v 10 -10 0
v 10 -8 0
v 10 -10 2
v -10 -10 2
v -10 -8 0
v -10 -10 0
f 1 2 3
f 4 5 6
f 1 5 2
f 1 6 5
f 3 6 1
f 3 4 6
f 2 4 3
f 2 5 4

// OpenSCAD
// file: triangle.scad
module triangle(c, height, betha)
{ 
    c_right=height*cos(betha);
    c_left=-c+height*cos(betha);
    // draw triangle c=x, C=[0,heigth]
    polygon(points=[ [c_left,0], [c_right,0], [0,height] ]);
}

module isosides_triangle(a)
{
      height= sin(60)*a;
    // draw triangle c=x, C=[0,heigth]
      polygon(points=[ [-a/2,0], [a/2,0], [0,height] ]);
}

module isosceles_triangle(c,height)
{
    // draw triangle c=x, C=[0,heigth]
     polygon(points=[ [-c/2,0], [c/2,0], [0,height] ]);
}

module rightangular_triangle(width, height)
{
      // draw triangle c=x, C=[0,heigth]
     polygon(points=[ [0,0], [width,0], [0,height] ]);
}

rightangular_triangle(2,2);
// main file
// holder triangle
use <triangle.scad>

module holder_triangle(space=[20,20],clearance=2, fillout=1)
    {
      translate([0,-space[0]/2,0])rotate([0,-90,0]) linear_extrude(height = space[1]*fillout, center = true) {rightangular_triangle(clearance,clearance);}
    }
    
 holder_triangle();
